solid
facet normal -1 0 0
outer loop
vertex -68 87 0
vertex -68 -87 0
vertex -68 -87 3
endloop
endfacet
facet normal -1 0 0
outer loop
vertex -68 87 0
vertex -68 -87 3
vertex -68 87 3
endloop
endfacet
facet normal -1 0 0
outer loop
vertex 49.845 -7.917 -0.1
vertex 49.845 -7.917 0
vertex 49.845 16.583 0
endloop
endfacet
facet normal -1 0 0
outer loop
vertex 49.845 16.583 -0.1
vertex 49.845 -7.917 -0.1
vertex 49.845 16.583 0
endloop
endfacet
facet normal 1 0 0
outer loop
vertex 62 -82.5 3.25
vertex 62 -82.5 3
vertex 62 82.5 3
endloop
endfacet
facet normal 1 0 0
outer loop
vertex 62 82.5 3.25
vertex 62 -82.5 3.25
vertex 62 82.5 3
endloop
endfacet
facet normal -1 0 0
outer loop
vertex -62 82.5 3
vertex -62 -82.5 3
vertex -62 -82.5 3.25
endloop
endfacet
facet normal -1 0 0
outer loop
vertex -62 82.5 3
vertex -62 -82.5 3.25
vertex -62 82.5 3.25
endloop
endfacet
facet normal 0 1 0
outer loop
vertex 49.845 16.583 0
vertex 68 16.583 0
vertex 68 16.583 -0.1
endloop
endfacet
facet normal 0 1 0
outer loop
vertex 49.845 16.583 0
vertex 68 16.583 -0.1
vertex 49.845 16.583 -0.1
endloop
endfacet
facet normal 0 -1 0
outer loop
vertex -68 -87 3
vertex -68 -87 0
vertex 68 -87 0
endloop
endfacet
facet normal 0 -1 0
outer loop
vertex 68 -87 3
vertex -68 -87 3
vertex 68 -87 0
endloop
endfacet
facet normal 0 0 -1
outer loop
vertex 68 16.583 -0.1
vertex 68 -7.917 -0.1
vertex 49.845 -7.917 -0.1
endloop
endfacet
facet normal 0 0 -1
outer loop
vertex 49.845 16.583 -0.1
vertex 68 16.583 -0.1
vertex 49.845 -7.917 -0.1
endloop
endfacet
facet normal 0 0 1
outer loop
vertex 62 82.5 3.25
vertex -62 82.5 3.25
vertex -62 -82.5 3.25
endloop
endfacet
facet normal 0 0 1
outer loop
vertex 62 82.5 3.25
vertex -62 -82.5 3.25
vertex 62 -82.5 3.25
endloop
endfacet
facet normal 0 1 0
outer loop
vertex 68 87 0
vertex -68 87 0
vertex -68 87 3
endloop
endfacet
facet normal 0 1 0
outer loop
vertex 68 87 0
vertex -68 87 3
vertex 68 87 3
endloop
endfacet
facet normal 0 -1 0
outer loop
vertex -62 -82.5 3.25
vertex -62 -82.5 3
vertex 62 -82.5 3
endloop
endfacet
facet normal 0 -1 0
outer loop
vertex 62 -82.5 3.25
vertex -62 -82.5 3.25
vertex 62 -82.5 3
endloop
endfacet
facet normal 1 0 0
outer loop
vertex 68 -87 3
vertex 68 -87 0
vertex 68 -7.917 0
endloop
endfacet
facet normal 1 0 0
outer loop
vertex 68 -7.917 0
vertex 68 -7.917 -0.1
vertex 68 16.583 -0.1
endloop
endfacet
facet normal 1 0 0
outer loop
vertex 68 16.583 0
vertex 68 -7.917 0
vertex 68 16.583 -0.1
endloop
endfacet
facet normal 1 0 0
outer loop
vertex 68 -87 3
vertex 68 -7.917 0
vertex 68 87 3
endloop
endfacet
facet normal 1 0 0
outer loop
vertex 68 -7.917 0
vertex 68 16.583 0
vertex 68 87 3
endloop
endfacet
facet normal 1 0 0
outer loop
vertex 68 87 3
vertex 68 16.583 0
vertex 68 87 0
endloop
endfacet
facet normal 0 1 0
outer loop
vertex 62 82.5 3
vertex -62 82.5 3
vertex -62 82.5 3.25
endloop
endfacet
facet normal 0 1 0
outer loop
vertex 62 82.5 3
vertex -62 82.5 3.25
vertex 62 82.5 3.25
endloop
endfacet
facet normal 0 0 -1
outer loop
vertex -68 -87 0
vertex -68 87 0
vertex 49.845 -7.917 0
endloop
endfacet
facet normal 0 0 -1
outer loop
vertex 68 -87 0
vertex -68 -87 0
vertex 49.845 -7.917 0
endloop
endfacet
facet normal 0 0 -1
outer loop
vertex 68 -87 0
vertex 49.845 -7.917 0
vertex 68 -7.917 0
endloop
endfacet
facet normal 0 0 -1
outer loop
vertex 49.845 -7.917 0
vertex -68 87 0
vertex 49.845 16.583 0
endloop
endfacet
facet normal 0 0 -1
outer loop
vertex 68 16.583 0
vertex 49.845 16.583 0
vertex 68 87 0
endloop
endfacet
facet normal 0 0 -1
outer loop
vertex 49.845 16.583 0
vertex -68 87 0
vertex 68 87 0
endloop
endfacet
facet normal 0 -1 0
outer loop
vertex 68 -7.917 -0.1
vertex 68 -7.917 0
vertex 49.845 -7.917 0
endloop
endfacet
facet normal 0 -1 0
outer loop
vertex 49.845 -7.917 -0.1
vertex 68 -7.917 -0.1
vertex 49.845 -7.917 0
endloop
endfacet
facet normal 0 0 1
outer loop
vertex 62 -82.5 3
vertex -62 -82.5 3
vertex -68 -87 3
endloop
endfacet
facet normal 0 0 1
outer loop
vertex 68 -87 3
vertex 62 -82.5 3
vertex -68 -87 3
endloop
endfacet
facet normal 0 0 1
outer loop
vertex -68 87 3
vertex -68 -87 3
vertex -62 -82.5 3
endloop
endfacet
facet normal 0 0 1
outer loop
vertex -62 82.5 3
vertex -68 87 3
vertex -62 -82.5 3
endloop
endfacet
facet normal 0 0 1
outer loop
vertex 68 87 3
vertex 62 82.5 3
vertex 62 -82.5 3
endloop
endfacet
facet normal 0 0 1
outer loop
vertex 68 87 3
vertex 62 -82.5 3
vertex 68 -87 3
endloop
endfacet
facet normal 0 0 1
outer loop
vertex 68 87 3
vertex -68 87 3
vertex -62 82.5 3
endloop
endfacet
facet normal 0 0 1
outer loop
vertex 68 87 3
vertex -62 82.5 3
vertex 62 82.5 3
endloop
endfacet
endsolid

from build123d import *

# Parameters (mm, degrees)
SKETCH1_W           = 136
SKETCH1_H           = 174
BOSS_EXTRUDE1_DEPTH = 3
SKETCH2_W           = 124
SKETCH2_H           = 165
BOSS_EXTRUDE2_DEPTH = 0.25
SKETCH3_W           = 18.155382523
SKETCH3_H           = 24.50047974
BOSS_EXTRUDE3_DEPTH = 0.1


with BuildPart() as part:
    # Sketch1 → Boss-Extrude1 (new body)
    with BuildSketch(Plane.XY):
        Rectangle(SKETCH1_W, SKETCH1_H)
    extrude(amount=BOSS_EXTRUDE1_DEPTH)

    # Sketch2 → Boss-Extrude2 (add)
    with BuildSketch(Plane.XY.offset(3)):
        Rectangle(SKETCH2_W, SKETCH2_H)
    extrude(amount=BOSS_EXTRUDE2_DEPTH)

    # Sketch3 → Boss-Extrude3 (add)
    with BuildSketch(Plane(origin=(0, 0, 0), x_dir=(-1, 0, 0), z_dir=(0, 0, -1))):
        with Locations((-58.922308738, 4.333016158)):
            Rectangle(SKETCH3_W, SKETCH3_H)
    extrude(amount=BOSS_EXTRUDE3_DEPTH)


solid = part.part
